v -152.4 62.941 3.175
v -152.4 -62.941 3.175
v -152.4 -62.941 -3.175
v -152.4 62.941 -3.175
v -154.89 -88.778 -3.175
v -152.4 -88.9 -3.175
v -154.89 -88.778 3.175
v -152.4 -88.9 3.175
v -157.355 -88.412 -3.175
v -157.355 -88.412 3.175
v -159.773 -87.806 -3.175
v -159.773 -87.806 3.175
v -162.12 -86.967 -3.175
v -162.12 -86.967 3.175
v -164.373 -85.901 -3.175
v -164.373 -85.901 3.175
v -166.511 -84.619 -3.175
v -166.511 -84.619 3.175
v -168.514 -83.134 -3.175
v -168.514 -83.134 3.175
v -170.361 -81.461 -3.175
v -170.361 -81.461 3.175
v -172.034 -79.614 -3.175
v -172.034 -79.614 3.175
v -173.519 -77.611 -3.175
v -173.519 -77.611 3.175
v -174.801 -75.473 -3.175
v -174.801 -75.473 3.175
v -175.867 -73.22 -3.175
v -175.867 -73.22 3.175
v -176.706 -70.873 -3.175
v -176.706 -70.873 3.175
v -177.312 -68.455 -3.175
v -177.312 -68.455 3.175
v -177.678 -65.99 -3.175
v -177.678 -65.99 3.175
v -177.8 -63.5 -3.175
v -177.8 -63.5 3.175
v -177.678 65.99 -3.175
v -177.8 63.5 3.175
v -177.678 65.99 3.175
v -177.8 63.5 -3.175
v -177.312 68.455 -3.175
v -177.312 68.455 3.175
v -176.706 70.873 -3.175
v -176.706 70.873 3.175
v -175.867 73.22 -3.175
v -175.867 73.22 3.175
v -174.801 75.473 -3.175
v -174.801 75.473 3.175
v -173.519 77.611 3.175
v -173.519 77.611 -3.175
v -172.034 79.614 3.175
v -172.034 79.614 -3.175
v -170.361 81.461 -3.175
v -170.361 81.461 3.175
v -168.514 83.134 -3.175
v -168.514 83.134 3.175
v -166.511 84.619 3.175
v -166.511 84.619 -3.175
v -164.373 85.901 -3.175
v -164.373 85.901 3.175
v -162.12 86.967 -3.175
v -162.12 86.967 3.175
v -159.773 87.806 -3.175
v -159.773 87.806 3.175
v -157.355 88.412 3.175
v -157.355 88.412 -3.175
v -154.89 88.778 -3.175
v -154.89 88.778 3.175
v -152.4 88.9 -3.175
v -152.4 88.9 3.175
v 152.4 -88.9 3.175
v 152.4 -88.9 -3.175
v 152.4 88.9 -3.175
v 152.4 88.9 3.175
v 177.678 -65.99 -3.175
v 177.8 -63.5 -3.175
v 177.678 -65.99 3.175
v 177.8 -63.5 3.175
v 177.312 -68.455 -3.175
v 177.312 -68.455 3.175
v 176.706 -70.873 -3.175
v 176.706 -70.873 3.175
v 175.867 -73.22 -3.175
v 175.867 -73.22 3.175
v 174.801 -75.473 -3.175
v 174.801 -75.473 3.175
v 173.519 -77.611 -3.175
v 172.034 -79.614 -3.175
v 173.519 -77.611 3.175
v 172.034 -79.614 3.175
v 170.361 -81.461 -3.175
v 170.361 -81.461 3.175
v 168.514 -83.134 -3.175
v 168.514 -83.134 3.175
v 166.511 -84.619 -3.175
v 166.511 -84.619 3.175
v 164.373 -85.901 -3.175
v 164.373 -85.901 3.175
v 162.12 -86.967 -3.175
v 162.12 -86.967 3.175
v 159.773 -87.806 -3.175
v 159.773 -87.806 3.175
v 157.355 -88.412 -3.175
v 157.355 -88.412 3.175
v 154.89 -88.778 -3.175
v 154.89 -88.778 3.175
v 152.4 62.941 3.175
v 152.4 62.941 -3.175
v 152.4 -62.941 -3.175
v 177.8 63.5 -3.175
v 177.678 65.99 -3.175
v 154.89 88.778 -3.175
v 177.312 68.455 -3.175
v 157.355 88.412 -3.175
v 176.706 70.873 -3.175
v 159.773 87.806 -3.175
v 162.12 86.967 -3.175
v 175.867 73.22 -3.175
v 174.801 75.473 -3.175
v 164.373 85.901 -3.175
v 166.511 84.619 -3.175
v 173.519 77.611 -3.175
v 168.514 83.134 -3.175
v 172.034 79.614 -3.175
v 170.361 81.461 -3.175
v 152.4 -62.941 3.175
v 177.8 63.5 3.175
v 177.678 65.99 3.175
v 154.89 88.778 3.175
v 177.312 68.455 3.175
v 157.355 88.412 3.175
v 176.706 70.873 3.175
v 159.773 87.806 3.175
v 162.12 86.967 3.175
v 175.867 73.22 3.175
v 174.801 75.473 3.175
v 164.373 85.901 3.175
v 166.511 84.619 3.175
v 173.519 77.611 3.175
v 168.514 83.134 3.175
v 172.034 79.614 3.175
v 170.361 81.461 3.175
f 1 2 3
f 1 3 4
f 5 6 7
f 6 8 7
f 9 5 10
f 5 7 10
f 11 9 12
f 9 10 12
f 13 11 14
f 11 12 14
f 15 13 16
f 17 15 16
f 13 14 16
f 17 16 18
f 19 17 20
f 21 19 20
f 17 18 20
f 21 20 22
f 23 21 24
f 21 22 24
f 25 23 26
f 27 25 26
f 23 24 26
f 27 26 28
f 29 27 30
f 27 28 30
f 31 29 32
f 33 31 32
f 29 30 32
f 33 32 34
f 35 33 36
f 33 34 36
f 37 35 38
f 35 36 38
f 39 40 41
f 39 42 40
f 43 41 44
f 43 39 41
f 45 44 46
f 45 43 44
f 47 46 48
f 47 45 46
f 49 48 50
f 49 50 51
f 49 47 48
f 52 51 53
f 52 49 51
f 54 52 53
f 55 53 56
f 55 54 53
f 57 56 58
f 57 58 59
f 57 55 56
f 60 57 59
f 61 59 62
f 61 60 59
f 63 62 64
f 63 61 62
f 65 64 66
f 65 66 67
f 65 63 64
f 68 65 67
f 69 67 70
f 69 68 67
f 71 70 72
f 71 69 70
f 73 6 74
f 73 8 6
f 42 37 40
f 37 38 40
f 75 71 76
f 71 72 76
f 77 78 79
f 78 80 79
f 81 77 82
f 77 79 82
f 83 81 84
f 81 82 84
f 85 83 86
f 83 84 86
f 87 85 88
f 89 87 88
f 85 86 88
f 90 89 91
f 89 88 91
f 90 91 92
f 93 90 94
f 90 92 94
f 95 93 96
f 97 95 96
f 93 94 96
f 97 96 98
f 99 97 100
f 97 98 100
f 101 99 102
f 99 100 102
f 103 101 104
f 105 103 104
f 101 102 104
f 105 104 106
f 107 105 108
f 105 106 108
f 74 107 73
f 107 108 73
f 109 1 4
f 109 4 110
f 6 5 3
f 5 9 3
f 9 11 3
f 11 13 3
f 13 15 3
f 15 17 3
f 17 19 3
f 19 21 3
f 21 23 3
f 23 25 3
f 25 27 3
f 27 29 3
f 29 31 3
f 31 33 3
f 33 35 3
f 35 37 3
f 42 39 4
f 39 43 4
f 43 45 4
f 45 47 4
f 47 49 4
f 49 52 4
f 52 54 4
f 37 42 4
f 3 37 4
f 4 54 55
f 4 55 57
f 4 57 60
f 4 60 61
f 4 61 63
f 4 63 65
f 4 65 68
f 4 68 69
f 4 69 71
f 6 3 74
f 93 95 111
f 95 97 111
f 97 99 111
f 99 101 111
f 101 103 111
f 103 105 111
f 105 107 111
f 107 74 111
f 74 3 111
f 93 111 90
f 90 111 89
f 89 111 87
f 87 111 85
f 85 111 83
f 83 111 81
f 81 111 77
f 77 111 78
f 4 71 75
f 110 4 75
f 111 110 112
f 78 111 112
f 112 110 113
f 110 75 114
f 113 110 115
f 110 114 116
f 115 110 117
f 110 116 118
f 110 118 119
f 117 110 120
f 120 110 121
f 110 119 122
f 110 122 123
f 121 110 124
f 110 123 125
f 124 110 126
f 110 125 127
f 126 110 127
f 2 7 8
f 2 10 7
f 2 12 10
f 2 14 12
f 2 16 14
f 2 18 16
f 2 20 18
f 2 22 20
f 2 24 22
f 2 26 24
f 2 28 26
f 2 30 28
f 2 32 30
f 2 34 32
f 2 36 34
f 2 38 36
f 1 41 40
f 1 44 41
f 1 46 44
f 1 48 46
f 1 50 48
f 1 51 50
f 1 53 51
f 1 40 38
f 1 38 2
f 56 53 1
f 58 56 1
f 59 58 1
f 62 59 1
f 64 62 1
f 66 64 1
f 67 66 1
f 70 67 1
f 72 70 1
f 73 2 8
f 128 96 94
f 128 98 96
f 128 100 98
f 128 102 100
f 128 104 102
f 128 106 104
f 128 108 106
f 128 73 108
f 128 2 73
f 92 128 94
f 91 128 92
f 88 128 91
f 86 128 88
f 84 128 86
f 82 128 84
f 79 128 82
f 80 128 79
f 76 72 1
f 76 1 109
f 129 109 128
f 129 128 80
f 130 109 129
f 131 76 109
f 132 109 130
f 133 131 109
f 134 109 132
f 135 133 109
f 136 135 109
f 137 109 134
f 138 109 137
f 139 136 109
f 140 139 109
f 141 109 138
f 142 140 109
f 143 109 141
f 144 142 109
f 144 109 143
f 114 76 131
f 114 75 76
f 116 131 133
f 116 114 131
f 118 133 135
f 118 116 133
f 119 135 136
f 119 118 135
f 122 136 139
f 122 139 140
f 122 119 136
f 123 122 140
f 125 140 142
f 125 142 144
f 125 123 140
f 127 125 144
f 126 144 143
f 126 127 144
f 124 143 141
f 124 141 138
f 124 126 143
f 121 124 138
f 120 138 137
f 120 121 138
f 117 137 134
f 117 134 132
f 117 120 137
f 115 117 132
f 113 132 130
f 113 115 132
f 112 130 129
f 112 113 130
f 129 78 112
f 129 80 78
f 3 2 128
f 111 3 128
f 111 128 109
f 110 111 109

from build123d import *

# Parameters (mm, degrees)
F0_W     = 304.8
F0_H     = 125.8824
F1_DEPTH = 3.175
F2_W     = 355.6
F2_H     = 177.8
F3_DEPTH = 3.175
F4_DEPTH = 12.7
F5_R     = 25.4
F6_R     = 25.4
F7_R     = 25.4
F8_R     = 25.4


with BuildPart() as f1:
    # F0 (on Top) → F1 (new body, symmetric)
    with BuildSketch(Plane.XY):
        Rectangle(F0_W, F0_H)
    extrude(amount=F1_DEPTH, both=True)

    # F2 (on Top) → F3 (join, symmetric)
    with BuildSketch(Plane.XY):
        Rectangle(F2_W, F2_H)
    extrude(amount=F3_DEPTH, both=True)

    # F0 (on Top) → F4 (cut, symmetric)
    with BuildSketch(Plane.XY):
        Rectangle(F0_W, F0_H)
    extrude(amount=F4_DEPTH, both=True, mode=Mode.SUBTRACT)

    # F5
    f5_edges = [f1.edges().sort_by_distance(p)[0] for p in [
        (-177.8, 88.9, 0),
    ]]
    fillet(f5_edges, radius=F5_R)

    # F6
    f6_edges = [f1.edges().sort_by_distance(p)[0] for p in [
        (177.8, 88.9, 0),
    ]]
    fillet(f6_edges, radius=F6_R)

    # F7
    f7_edges = [f1.edges().sort_by_distance(p)[0] for p in [
        (177.8, -88.9, 0),
    ]]
    fillet(f7_edges, radius=F7_R)

    # F8
    f8_edges = [f1.edges().sort_by_distance(p)[0] for p in [
        (-177.8, -88.9, 0),
    ]]
    fillet(f8_edges, radius=F8_R)


solid = f1.part
